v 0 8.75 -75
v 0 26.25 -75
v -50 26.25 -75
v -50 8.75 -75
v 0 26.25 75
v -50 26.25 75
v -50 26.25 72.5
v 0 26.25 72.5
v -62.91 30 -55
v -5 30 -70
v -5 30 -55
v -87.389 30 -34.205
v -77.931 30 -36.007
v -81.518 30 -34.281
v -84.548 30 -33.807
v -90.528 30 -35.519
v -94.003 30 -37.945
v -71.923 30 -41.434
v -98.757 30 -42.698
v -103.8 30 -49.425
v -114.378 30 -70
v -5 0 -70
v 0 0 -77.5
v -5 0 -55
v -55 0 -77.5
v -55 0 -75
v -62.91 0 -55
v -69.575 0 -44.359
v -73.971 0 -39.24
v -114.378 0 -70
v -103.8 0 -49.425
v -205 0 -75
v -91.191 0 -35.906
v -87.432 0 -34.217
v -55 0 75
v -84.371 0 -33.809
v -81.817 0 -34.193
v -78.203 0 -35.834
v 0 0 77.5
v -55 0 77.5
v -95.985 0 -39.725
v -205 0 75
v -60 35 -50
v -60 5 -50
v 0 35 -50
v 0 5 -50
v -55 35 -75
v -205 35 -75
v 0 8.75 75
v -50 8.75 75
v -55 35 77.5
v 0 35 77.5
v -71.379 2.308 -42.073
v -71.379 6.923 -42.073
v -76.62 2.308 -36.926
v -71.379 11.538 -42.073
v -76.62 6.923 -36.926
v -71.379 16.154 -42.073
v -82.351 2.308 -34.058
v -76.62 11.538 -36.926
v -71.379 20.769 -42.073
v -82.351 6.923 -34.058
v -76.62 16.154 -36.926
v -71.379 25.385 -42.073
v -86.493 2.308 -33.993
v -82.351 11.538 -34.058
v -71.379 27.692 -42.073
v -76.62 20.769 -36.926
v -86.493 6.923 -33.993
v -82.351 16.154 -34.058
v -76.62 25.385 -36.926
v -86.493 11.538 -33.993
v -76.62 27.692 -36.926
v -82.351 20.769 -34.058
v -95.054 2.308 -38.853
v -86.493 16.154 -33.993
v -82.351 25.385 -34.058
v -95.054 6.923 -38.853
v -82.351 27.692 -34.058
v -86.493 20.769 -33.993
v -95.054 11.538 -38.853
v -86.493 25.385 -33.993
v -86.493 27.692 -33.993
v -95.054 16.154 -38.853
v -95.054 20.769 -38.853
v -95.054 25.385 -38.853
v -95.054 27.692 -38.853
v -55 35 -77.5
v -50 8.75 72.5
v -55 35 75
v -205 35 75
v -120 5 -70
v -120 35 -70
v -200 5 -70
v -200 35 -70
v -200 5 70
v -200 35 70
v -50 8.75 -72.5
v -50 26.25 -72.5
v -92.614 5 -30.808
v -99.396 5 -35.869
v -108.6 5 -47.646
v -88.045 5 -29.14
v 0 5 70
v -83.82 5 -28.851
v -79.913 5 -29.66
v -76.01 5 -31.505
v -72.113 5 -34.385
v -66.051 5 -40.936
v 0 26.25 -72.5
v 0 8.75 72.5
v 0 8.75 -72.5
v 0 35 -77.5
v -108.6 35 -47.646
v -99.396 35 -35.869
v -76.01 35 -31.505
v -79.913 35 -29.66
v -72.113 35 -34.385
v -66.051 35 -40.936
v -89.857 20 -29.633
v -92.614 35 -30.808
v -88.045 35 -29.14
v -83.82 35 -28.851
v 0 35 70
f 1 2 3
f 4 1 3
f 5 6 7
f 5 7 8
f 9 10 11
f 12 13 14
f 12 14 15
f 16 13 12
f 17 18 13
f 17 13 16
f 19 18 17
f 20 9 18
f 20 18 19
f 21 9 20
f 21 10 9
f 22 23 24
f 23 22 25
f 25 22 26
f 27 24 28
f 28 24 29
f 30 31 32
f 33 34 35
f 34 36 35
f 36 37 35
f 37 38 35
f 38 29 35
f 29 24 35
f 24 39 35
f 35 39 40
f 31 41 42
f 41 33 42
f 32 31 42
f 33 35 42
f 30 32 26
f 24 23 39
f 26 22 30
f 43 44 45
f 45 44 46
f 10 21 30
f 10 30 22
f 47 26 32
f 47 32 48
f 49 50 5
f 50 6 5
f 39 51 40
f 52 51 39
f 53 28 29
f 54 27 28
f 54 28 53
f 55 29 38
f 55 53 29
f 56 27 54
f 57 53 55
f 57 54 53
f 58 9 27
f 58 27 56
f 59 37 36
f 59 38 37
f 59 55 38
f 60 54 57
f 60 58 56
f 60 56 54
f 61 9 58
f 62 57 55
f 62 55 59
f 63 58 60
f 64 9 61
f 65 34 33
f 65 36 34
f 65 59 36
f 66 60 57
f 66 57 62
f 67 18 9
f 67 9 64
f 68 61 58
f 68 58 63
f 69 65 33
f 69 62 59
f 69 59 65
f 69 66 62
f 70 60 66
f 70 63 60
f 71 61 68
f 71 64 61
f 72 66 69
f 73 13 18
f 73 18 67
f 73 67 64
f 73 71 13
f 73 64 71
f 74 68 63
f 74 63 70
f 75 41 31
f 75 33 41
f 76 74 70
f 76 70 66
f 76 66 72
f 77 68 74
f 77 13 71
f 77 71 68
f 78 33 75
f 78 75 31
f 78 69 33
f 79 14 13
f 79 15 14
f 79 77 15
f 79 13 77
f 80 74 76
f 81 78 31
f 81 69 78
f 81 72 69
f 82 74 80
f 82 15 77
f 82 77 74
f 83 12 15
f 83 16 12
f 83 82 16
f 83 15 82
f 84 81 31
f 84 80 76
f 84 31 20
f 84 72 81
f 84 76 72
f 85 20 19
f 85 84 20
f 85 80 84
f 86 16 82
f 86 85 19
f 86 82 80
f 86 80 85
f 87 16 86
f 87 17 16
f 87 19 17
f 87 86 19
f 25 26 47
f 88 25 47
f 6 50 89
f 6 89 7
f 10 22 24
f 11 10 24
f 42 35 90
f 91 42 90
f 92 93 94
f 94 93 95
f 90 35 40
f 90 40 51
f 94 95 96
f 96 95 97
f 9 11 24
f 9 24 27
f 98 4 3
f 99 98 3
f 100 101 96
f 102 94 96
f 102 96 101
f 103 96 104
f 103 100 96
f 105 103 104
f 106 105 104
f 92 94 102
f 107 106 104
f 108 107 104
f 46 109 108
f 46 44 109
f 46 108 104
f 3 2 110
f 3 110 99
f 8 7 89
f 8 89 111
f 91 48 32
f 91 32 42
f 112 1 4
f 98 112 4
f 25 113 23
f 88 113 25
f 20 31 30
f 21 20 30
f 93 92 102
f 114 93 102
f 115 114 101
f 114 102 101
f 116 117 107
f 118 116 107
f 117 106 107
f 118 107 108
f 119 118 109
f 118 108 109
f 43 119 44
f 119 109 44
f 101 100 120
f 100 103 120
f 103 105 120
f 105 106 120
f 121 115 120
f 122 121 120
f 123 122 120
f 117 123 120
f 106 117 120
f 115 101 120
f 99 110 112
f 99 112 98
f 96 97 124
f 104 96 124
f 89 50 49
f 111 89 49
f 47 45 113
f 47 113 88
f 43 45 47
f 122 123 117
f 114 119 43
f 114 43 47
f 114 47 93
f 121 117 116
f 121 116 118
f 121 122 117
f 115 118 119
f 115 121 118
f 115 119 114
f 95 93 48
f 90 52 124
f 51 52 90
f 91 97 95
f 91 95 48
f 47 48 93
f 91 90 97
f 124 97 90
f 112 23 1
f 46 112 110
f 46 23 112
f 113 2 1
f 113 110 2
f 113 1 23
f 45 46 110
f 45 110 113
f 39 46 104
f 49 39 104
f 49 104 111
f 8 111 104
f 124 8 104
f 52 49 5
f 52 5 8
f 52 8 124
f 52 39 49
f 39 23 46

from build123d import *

# Parameters (mm, degrees)
SALIENTE_EXTRUIR5_DEPTH  = 35
SALIENTE_EXTRUIR6_DEPTH  = 5
CROQUIS8_W               = 200
CROQUIS8_H               = 35
SALIENTE_EXTRUIR8_DEPTH  = 5
CROQUIS7_W               = 200
CROQUIS7_H               = 35
SALIENTE_EXTRUIR9_DEPTH  = 5
CROQUIS10_W              = 150
CROQUIS10_H              = 35
SALIENTE_EXTRUIR10_DEPTH = 5
CROQUIS11_W              = 50
CROQUIS11_H              = 17.5
CORTAR_EXTRUIR1_DEPTH    = 2.5
CROQUIS12_W              = 50
CROQUIS12_H              = 17.5
CORTAR_EXTRUIR2_DEPTH    = 2.5
CROQUIS13_W              = 55
CROQUIS13_H              = 35
SALIENTE_EXTRUIR11_DEPTH = 2.5
CROQUIS14_W              = 55
CROQUIS14_H              = 35
SALIENTE_EXTRUIR12_DEPTH = 2.5
CORTAR_EXTRUIR3_START    = -5
CORTAR_EXTRUIR3_DEPTH    = 40


with BuildPart() as part:
    # Croquis2 → Saliente-Extruir5 (new body)
    with BuildSketch(Plane(origin=(0, 0, 0), x_dir=(1, 0, 0), z_dir=(0, 1, 0))):
        with BuildLine():
            Line((-60, 70), (-120, 70))
            add(Edge.make_bspline(
                [(-120, 70), (-89.713167171, -0.733691908), (-60, 50)],
                knots=[0, 0, 0, 1, 1, 1], degree=2))
            Line((-60, 50), (0, 50))
            Line((0, 50), (0, 70))
            Line((0, 70), (-60, 70))
        make_face()
    extrude(amount=SALIENTE_EXTRUIR5_DEPTH)

    # Croquis2<6> → Saliente-Extruir6 (add)
    with BuildSketch(Plane(origin=(0, 0, 0), x_dir=(1, 0, 0), z_dir=(0, 1, 0))):
        with BuildLine():
            Line((-120, 70), (-200, 70))
            Line((-200, 70), (-200, -70))
            Line((-200, -70), (0, -70))
            Line((0, -70), (0, 50))
            Line((0, 50), (-60, 50))
            add(Edge.make_bspline(
                [(-120, 70), (-89.713167171, -0.733691908), (-60, 50)],
                knots=[0, 0, 0, 1, 1, 1], degree=2))
        make_face()
    extrude(amount=SALIENTE_EXTRUIR6_DEPTH)

    # Croquis8 → Saliente-Extruir8 (add)
    with BuildSketch(Plane(origin=(0, 0, -70), x_dir=(-1, 0, 0), z_dir=(0, 0, -1))):
        with Locations((100, 17.5)):
            Rectangle(CROQUIS8_W, CROQUIS8_H)
    extrude(amount=SALIENTE_EXTRUIR8_DEPTH)

    # Croquis7 → Saliente-Extruir9 (add)
    with BuildSketch(Plane.XY.offset(70)):
        with Locations((-100, 17.5)):
            Rectangle(CROQUIS7_W, CROQUIS7_H)
    extrude(amount=SALIENTE_EXTRUIR9_DEPTH)

    # Croquis10 → Saliente-Extruir10 (add)
    with BuildSketch(Plane.ZY.offset(200)):
        with Locations((0, 17.5)):
            Rectangle(CROQUIS10_W, CROQUIS10_H)
    extrude(amount=SALIENTE_EXTRUIR10_DEPTH)

    # Croquis11 → Cortar-Extruir1 (cut)
    with BuildSketch(Plane.XY.offset(75)):
        with Locations((-25, 17.5)):
            Rectangle(CROQUIS11_W, CROQUIS11_H)
    extrude(amount=-CORTAR_EXTRUIR1_DEPTH, mode=Mode.SUBTRACT)

    # Croquis12 → Cortar-Extruir2 (cut)
    with BuildSketch(Plane(origin=(0, 0, -75), x_dir=(-1, 0, 0), z_dir=(0, 0, -1))):
        with Locations((25, 17.5)):
            Rectangle(CROQUIS12_W, CROQUIS12_H)
    extrude(amount=-CORTAR_EXTRUIR2_DEPTH, mode=Mode.SUBTRACT)

    # Croquis13 → Saliente-Extruir11 (add)
    with BuildSketch(Plane.XY.offset(75)):
        with Locations((-27.5, 17.5)):
            Rectangle(CROQUIS13_W, CROQUIS13_H)
    extrude(amount=SALIENTE_EXTRUIR11_DEPTH)

    # Croquis14 → Saliente-Extruir12 (add)
    with BuildSketch(Plane(origin=(0, 0, -75), x_dir=(-1, 0, 0), z_dir=(0, 0, -1))):
        with Locations((27.5, 17.5)):
            Rectangle(CROQUIS14_W, CROQUIS14_H)
    extrude(amount=SALIENTE_EXTRUIR12_DEPTH)

    # Croquis15 → Cortar-Extruir3 (cut)
    with BuildSketch(Plane(origin=(0, 35, 0), x_dir=(1, 0, 0), z_dir=(0, 1, 0)).offset(CORTAR_EXTRUIR3_START)):
        with BuildLine():
            Line((-114.377865487, 70), (-5, 70))
            Line((-5, 70), (-5, 55))
            Line((-5, 55), (-62.909565923, 55))
            add(Edge.make_bspline(
                [(-62.909565923, 55), (-63.466265427, 54.021602214), (-64.401186981, 52.372327996), (-65.10401925, 51.155937563), (-66.343867423, 49.084457263), (-69.328375649, 44.517477078), (-74.11230077, 38.812847857), (-78.500104352, 35.511092249), (-81.30486337, 34.292403361), (-83.396178275, 33.823757561), (-85.433716297, 33.792096113), (-88.081814147, 34.294431754), (-92.286089613, 36.365158599), (-99.205160513, 42.585467381), (-103.799594749, 49.425151944)],
                knots=[-0.031024165, -0.031024165, -0.031024165, -0.006934179, 0.009125811, 0.025185801, 0.065335777, 0.16169572, 0.290175643, 0.386535585, 0.450775546, 0.515015508, 0.579255469, 0.675615411, 0.804095334, 0.996815219, 0.996815219, 0.996815219], degree=2))
            Line((-103.799594749, 49.425151944), (-114.377865487, 70))
        make_face()
    extrude(amount=-CORTAR_EXTRUIR3_DEPTH, mode=Mode.SUBTRACT)


solid = part.part
